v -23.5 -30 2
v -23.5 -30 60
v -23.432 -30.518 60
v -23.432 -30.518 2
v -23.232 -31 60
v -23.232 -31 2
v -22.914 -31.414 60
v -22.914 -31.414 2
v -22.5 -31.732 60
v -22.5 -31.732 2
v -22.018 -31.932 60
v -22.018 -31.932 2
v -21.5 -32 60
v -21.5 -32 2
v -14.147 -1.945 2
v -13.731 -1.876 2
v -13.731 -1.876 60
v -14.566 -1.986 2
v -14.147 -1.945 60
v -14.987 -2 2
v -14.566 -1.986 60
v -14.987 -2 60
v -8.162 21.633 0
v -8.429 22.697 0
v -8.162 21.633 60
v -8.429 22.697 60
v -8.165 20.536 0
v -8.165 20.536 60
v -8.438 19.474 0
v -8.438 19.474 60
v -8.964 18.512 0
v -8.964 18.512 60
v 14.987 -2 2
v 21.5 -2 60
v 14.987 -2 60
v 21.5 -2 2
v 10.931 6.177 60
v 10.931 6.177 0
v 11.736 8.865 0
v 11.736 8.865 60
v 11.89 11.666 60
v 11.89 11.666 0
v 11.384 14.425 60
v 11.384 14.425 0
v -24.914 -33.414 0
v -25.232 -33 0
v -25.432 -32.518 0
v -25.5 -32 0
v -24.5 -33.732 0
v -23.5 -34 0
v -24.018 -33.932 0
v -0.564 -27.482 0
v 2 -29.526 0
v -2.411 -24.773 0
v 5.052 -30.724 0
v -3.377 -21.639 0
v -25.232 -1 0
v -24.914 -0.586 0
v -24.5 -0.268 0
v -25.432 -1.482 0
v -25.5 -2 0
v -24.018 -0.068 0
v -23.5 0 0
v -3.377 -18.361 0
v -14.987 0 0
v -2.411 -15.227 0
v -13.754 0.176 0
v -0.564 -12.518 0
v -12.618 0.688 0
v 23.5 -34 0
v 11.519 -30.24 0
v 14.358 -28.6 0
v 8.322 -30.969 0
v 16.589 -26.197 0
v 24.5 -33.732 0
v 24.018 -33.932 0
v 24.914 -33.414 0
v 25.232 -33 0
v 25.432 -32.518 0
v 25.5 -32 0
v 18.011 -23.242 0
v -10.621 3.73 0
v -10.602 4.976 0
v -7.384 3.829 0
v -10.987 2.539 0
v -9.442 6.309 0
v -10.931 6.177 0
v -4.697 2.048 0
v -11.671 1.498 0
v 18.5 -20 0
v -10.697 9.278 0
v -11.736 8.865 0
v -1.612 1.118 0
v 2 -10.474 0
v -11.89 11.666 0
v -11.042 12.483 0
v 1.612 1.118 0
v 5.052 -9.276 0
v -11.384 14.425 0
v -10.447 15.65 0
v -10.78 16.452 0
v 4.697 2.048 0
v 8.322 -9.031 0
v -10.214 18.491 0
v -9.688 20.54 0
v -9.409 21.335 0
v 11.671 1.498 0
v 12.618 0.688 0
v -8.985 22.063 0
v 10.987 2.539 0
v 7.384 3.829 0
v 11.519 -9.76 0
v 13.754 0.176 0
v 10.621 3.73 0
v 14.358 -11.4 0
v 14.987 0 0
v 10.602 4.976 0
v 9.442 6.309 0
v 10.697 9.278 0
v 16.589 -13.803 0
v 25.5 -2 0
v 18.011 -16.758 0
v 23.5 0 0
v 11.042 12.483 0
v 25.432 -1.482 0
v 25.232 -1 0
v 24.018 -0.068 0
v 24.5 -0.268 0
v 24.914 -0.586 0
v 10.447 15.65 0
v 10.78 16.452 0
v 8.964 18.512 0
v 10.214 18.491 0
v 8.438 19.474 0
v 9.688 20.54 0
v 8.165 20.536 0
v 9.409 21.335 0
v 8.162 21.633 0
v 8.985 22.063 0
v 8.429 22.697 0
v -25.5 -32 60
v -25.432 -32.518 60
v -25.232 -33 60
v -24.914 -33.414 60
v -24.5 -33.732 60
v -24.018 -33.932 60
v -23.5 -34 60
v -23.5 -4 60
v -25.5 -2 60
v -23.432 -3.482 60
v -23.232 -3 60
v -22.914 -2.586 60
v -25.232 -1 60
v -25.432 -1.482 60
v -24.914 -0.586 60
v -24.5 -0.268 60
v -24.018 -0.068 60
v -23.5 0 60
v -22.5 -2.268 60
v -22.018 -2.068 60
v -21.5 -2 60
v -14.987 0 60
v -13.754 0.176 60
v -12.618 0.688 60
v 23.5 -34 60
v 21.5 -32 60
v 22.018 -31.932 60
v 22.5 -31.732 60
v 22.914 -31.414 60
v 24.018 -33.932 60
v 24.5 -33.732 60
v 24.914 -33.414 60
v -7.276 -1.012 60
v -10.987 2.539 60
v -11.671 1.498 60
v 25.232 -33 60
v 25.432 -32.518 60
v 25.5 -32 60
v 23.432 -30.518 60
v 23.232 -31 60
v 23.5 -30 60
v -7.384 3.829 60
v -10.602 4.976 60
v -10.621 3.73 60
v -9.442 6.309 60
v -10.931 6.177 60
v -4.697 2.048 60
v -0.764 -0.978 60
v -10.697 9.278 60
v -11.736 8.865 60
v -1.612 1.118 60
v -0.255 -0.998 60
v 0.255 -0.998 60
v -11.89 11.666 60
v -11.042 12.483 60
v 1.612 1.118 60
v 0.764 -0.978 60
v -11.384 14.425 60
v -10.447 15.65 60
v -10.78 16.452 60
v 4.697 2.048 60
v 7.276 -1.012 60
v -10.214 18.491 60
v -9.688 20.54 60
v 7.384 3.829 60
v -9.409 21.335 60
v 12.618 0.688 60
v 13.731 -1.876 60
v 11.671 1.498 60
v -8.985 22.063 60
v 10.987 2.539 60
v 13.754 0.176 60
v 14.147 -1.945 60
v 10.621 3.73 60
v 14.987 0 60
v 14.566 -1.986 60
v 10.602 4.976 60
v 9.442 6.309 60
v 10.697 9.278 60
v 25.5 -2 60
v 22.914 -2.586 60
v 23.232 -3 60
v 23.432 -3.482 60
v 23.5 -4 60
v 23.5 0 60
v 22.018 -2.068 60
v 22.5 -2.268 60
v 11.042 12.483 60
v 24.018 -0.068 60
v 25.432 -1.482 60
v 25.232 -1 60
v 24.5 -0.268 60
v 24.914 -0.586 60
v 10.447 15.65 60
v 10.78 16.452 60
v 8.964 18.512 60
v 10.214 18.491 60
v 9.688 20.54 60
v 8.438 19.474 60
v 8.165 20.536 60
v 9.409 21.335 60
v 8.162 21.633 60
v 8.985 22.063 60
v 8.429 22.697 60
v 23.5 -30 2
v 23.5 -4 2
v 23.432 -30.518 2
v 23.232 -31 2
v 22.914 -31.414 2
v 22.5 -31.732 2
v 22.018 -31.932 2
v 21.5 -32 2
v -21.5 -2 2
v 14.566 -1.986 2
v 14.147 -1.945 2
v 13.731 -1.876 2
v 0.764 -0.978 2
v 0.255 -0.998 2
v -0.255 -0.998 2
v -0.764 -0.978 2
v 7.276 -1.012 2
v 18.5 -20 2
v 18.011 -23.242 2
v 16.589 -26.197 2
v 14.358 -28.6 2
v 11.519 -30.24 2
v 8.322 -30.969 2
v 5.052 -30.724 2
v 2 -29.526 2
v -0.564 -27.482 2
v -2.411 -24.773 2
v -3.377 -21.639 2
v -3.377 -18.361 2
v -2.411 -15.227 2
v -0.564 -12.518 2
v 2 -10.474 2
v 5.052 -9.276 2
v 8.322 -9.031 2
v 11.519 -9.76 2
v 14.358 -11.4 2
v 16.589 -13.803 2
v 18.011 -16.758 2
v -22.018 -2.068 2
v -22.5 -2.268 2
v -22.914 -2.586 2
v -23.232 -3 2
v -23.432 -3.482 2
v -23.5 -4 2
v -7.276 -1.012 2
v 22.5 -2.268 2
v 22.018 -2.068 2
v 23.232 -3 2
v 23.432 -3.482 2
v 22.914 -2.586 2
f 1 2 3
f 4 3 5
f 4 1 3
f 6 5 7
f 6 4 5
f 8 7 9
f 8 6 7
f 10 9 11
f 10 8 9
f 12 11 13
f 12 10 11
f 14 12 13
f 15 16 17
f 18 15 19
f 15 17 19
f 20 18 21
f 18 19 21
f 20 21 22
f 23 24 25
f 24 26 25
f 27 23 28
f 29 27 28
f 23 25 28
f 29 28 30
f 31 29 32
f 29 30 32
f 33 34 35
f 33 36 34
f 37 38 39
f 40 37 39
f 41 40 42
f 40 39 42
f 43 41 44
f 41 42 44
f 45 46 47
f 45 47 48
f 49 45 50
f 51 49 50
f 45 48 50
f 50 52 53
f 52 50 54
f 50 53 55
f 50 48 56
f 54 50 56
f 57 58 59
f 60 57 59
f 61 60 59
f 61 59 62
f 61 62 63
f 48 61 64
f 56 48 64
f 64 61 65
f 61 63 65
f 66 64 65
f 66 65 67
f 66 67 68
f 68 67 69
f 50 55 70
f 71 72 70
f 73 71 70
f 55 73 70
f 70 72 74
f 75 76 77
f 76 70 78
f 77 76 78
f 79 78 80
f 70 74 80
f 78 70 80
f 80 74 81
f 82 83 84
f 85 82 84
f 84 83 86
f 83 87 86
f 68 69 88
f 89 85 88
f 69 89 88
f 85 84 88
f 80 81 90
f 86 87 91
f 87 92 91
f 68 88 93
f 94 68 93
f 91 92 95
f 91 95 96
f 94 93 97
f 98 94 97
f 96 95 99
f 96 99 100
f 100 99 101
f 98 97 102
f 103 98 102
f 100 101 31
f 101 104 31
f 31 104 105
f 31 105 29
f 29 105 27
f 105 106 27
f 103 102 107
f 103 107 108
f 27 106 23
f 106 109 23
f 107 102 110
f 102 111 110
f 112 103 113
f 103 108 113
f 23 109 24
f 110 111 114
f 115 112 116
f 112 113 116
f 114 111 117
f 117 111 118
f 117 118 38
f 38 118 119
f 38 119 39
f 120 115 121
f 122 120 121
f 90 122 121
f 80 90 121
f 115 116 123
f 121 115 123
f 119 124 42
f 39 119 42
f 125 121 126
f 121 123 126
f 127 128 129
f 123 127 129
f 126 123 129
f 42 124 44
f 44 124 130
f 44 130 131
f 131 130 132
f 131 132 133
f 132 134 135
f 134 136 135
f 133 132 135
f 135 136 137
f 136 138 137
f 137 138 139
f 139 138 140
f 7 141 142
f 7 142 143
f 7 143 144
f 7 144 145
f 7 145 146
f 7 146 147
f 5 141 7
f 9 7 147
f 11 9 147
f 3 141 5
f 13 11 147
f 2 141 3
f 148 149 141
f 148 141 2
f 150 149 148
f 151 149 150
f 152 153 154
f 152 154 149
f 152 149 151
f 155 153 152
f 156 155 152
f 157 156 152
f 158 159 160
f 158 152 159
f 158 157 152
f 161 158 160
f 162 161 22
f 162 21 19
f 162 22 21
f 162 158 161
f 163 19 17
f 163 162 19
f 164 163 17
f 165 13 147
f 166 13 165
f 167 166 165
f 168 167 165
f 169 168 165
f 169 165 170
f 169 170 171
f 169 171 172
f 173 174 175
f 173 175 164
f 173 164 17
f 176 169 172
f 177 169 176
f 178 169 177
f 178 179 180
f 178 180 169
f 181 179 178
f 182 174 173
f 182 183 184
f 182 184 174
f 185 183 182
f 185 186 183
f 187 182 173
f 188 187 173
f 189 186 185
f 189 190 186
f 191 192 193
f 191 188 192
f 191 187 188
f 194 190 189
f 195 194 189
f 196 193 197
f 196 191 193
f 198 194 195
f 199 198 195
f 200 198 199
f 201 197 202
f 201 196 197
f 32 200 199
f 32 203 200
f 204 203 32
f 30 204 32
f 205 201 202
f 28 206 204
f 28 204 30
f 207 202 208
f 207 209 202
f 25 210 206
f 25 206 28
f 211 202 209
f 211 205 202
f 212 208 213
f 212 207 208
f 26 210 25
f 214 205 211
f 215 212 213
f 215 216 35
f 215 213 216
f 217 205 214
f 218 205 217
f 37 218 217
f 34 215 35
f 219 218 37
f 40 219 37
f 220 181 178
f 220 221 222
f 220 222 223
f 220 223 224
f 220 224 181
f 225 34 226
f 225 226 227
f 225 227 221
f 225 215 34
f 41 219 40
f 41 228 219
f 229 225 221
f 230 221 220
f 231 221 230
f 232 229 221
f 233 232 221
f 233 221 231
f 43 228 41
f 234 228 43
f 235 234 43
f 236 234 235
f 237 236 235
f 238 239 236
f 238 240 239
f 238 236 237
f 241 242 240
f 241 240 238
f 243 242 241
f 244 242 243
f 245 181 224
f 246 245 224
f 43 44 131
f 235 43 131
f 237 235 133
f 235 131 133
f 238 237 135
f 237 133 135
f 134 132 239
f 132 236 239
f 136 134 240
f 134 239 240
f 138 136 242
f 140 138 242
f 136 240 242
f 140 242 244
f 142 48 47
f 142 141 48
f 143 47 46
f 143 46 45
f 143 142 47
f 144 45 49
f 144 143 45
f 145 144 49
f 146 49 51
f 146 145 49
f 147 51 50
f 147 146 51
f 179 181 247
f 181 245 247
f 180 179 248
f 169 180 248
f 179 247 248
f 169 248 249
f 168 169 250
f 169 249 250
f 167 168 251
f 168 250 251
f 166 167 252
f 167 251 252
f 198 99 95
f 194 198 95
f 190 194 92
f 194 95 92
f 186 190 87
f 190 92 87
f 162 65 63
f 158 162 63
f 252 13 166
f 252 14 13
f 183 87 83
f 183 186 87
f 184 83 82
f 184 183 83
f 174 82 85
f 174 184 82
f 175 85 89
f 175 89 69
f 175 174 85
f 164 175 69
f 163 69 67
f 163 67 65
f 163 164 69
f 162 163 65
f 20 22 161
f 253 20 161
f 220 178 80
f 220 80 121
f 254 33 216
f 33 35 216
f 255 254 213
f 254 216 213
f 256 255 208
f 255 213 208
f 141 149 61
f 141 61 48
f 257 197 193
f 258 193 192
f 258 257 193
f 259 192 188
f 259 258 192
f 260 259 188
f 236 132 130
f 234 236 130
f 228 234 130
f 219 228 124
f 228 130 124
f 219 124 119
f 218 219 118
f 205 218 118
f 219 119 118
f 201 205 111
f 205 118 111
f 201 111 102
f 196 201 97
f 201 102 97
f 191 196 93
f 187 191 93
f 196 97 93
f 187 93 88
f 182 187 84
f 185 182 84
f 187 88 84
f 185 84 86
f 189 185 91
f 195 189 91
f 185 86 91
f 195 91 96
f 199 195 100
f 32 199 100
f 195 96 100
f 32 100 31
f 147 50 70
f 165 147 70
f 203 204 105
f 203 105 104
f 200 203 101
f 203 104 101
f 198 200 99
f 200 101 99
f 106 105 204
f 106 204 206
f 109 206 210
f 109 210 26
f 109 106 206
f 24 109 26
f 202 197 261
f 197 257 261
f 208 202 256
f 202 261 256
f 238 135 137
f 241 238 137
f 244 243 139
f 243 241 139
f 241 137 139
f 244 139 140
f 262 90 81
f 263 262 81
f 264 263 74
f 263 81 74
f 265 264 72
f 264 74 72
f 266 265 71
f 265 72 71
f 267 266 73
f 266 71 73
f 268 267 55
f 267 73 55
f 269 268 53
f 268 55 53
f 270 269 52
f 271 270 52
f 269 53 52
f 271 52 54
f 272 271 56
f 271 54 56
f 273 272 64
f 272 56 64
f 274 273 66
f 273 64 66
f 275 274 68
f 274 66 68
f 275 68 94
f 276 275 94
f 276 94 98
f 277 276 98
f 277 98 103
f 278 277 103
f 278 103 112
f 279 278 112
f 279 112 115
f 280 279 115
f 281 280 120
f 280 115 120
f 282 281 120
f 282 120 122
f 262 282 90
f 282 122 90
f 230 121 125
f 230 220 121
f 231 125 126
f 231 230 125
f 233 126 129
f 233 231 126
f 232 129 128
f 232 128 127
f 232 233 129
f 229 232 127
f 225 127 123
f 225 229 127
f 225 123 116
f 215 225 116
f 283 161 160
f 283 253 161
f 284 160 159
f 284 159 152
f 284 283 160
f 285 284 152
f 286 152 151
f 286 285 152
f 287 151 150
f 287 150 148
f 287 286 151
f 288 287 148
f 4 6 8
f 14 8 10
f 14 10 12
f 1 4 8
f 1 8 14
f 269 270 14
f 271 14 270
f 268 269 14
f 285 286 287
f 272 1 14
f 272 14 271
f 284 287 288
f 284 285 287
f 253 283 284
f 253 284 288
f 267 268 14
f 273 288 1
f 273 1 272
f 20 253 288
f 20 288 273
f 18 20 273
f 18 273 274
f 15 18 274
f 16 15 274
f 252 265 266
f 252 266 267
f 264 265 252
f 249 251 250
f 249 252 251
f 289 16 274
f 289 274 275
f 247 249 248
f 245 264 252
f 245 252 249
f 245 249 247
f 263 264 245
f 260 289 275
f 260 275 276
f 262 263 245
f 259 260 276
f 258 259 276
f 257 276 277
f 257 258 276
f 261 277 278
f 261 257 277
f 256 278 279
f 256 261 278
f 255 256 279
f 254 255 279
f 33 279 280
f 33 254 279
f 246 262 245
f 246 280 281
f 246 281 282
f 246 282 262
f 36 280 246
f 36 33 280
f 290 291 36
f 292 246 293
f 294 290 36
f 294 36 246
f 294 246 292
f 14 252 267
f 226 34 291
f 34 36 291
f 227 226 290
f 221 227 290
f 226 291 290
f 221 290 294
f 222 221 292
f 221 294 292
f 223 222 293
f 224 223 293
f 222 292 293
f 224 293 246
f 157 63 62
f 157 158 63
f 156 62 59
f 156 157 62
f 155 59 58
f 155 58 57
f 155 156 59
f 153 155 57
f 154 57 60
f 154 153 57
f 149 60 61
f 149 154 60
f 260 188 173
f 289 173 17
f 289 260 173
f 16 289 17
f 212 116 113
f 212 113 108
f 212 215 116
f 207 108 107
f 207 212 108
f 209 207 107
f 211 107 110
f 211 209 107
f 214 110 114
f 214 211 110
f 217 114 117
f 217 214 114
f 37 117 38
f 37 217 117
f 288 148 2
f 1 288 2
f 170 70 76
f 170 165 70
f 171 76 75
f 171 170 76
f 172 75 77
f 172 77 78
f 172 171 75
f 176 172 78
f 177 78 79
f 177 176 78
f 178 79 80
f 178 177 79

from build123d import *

# Parameters (mm, degrees)
F4_W        = 51
F4_H        = 32
F5_DEPTH    = 60
F6_T1_DEPTH = 60
F7_R        = 4.42
F9_T1_DEPTH = 77.3960297945
F10_T       = -2
F11_R       = 11
F12_DEPTH   = 2
F13_R       = 51
F14_R       = 2


# Not quite as in the source:
# - a fillet or chamfer that OpenCascade refuses, or shapes differently, is made with other operations: its cross-section is extruded or revolved along the edge and cut away or added
# - two fillets or chamfers of one size are made in one step


with BuildPart() as f5:
    # F4 (on Top) → F5 (new body)
    with BuildSketch(Plane.XY):
        with BuildLine():
            Line((-25.5, 0), (-25.5, -2))
            Line((-25.5, -2), (25.5, -2))
            Line((25.5, -2), (25.5, 0))
            Line((25.5, 0), (4.7777200824, 0))
            ThreePointArc((4.7777200824, 0), (0, -1), (-4.7777200824, 0))
            Line((-4.7777200824, 0), (-25.5, 0))
        make_face()
        with Locations((0, -18)):
            Rectangle(F4_W, F4_H)
        with BuildLine():
            ThreePointArc((-8.9084552032, 18.8231877912), (-11.6364061524, 8.3597035712), (-4.7777200824, 0))
            Line((-4.7777200824, 0), (4.7777200824, 0))
            ThreePointArc((4.7777200824, 0), (11.6364061524, 8.3597035712), (8.9084552032, 18.8231877912))
            ThreePointArc((8.9084552032, 18.8231877912), (8.2131677669, 19.5429454632), (7.4599259019, 20.2018099548))
            ThreePointArc((7.4599259019, 20.2018099548), (0, 1), (-7.4599259019, 20.2018099548))
            ThreePointArc((-7.4599259019, 20.2018099548), (-8.2131677669, 19.5429454632), (-8.9084552032, 18.8231877912))
        make_face()
        with BuildLine():
            Line((4.7777200824, 0), (-4.7777200824, 0))
            ThreePointArc((-4.7777200824, 0), (0, -1), (4.7777200824, 0))
        make_face()
        with BuildLine():
            Line((-8.9084552032, 23.9303167421), (-8.9084552032, 18.8231877912))
            ThreePointArc((-8.9084552032, 18.8231877912), (-8.2131677669, 19.5429454632), (-7.4599259019, 20.2018099548))
            Line((-7.4599259019, 20.2018099548), (-8.9084552032, 23.9303167421))
        make_face()
        with BuildLine():
            ThreePointArc((7.4599259019, 20.2018099548), (8.2131677669, 19.5429454632), (8.9084552032, 18.8231877912))
            Line((8.9084552032, 18.8231877912), (8.9084552032, 23.9303167421))
            Line((8.9084552032, 23.9303167421), (7.4599259019, 20.2018099548))
        make_face()
    extrude(amount=F5_DEPTH)

    # F6: fillet of radius 110.5 on 2 edges, made by hand

    # F6_s2 → F6_t1 (join)
    with BuildSketch(Plane.XY):
        with BuildLine():
            ThreePointArc((-8.9084552032, 23.9303167421), (-10.0405186332, 19.1502401697), (-11.3839102474, 14.4252006335))
            ThreePointArc((-11.3839102474, 14.4252006335), (-10.3817434304, 16.7567821247), (-8.9084552032, 18.8231877912))
            Line((-8.9084552032, 18.8231877912), (-8.9084552032, 23.9303167421))
        make_face()
        with BuildLine():
            ThreePointArc((11.3839102474, 14.4252006335), (10.0405186332, 19.1502401697), (8.9084552032, 23.9303167421))
            Line((8.9084552032, 23.9303167421), (8.9084552032, 18.8231877912))
            ThreePointArc((8.9084552032, 18.8231877912), (10.3817434304, 16.7567821247), (11.3839102474, 14.4252006335))
        make_face()
    extrude(amount=F6_T1_DEPTH)

    # F7
    f7_edges = [f5.edges().sort_by_distance(p)[0] for p in [
        (-4.77772, 0, 30),
        (4.77772, 0, 30),
        (7.459926, 20.20181, 30),
        (-7.459926, 20.20181, 30),
    ]]
    fillet(f7_edges, radius=F7_R)

    # F9: fillet of radius 4.42 on 2 edges, made by hand

    # F9_s2 → F9_t1 (cut)
    with BuildSketch(Plane.XY.offset(-8.6980148973)):
        with BuildLine():
            ThreePointArc((9.6882803435, 20.5396314345), (9.2143493926, 21.7090785299), (8.4292935977, 22.6969572949))
            Line((8.4292935977, 22.6969572949), (8.9084552032, 23.9303167421))
            ThreePointArc((8.9084552032, 23.9303167421), (9.2850220453, 22.2319046987), (9.6882803435, 20.5396314345))
        make_face()
        with BuildLine():
            ThreePointArc((-9.6882803435, 20.5396314345), (-9.2143493926, 21.7090785299), (-8.4292935977, 22.6969572949))
            Line((-8.4292935977, 22.6969572949), (-8.9084552032, 23.9303167421))
            ThreePointArc((-8.9084552032, 23.9303167421), (-9.2850220453, 22.2319046987), (-9.6882803435, 20.5396314345))
        make_face()
    extrude(amount=F9_T1_DEPTH, mode=Mode.SUBTRACT)

    # F10
    f10_openings = [f5.faces().sort_by_distance(p)[0] for p in [
        (0, -15.707049, 60),
    ]]
    offset(amount=F10_T, openings=f10_openings)

    # F11 (on face) → F12 (cut)
    with BuildSketch(Plane(origin=(0, 0, 0), x_dir=(1, 0, 0), z_dir=(0, 0, -1))):
        with Locations((7.5, 20)):
            Circle(F11_R)
    extrude(amount=-F12_DEPTH, mode=Mode.SUBTRACT)

    # F13
    f13_edges = [f5.edges().sort_by_distance(p)[0] for p in [
        (-8.868399, 2.47639, 31),
        (8.868399, 2.47639, 31),
    ]]
    fillet(f13_edges, radius=F13_R)

    # F14
    f14_edges = [f5.edges().sort_by_distance(p)[0] for p in [
        (-25.5, 0, 30),
        (25.5, 0, 30),
        (23.5, -32, 31),
        (-23.5, -32, 31),
        (25.5, -34, 30),
        (-25.5, -34, 30),
        (23.5, -2, 31),
        (-23.5, -2, 31),
    ]]
    fillet(f14_edges, radius=F14_R)


solid = f5.part
